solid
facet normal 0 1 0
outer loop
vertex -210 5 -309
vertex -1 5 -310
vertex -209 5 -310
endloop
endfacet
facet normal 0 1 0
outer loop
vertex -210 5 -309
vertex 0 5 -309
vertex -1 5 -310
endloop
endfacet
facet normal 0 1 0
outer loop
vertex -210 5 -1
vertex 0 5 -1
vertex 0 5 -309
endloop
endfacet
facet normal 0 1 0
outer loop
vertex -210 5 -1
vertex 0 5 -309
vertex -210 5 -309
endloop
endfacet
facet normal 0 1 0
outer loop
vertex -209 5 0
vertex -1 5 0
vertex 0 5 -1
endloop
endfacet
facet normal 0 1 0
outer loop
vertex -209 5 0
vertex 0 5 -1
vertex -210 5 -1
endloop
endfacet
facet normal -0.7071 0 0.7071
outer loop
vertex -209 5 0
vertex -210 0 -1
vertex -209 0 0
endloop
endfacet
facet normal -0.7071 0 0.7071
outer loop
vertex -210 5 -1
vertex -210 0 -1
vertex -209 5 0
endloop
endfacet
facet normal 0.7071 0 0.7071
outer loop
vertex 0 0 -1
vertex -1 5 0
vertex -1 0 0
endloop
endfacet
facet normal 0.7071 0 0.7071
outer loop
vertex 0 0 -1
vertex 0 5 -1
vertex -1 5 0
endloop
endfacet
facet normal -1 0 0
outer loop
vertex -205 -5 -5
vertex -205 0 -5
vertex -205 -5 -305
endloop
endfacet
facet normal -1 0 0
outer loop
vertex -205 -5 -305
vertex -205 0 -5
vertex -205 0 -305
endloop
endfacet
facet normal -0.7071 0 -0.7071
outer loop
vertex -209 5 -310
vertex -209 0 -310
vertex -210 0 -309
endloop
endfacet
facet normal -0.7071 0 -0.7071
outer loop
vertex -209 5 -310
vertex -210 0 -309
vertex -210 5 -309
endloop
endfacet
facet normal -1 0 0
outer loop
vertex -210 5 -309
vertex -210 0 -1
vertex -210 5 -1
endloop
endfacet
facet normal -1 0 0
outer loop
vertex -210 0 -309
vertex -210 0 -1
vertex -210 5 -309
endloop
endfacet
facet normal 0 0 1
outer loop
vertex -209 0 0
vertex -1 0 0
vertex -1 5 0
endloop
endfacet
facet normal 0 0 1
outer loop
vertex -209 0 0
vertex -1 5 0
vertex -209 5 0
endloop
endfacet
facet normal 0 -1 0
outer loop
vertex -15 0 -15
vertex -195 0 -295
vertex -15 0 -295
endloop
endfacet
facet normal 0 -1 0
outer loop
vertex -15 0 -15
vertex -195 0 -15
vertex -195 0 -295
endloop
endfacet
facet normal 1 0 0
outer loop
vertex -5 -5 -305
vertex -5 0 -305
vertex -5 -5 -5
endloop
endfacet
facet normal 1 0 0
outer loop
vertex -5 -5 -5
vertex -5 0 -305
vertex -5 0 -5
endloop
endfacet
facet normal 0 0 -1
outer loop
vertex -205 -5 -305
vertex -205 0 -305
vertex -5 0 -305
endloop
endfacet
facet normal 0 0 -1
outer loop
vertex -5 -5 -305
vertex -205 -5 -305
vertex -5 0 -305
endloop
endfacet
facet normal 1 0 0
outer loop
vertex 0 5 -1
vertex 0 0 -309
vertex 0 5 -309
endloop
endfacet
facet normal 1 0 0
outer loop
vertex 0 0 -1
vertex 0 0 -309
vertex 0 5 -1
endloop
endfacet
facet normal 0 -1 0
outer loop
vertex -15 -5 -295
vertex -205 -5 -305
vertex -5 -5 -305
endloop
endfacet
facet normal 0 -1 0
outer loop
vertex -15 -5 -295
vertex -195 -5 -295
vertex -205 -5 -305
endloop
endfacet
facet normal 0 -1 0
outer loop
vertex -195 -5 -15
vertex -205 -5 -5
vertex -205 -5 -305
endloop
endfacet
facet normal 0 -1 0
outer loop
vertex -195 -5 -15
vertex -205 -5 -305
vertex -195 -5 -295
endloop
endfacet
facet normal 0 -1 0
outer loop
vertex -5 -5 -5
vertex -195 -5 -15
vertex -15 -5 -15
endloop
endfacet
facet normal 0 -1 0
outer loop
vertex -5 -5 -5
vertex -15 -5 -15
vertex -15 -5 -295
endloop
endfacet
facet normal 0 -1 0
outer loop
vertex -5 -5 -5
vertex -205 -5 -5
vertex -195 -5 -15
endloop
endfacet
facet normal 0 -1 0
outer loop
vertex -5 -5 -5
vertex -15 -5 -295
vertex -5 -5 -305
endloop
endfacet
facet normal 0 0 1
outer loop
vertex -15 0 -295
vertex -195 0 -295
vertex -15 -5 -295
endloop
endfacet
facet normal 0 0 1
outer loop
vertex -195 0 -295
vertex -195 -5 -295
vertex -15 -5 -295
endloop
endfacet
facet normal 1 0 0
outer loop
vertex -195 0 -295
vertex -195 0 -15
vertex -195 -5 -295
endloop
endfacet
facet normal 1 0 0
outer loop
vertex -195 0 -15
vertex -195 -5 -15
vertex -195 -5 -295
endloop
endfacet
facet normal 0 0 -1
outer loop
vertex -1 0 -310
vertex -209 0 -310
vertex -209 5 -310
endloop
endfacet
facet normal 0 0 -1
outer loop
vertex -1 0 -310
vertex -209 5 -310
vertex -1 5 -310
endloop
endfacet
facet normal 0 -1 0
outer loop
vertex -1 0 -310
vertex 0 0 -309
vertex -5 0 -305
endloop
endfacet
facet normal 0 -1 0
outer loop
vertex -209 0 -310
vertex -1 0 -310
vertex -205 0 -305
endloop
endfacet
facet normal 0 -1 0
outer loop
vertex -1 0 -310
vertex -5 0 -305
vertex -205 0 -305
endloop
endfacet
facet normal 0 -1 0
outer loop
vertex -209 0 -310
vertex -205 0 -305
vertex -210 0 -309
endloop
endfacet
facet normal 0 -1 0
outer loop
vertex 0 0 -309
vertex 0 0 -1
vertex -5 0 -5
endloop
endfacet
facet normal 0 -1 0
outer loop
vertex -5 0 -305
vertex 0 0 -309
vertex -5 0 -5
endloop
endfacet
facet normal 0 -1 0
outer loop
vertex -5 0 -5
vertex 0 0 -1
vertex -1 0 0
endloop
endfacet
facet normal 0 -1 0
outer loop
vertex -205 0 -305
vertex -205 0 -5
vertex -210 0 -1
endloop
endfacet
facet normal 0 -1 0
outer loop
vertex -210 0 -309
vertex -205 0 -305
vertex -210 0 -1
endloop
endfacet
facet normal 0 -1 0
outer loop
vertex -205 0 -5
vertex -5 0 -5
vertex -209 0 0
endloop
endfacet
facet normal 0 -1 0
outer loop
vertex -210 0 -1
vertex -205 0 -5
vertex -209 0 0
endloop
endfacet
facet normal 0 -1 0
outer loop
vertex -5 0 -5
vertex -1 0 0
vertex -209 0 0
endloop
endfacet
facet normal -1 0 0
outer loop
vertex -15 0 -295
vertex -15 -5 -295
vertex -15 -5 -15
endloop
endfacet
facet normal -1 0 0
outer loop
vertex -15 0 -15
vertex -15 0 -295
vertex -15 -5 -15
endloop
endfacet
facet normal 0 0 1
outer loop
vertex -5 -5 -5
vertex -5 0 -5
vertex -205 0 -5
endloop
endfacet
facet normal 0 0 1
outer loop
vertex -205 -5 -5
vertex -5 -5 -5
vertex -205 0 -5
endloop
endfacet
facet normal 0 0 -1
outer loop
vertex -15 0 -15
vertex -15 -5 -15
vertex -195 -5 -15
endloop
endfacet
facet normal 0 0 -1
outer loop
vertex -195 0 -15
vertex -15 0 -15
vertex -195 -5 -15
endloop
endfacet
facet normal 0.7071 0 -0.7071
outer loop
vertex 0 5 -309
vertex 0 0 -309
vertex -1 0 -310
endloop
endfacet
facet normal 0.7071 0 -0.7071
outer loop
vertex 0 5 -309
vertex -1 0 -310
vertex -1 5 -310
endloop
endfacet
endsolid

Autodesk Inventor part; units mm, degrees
ref_plane "YZ Plane" through (0, 0, 0) normal (1, 0, 0) x (0, 1, 0)
ref_plane "XZ Plane" through (0, 0, 0) normal (0, 1, 0) x (-1, 0, 0)
ref_plane "XY Plane" through (0, 0, 0) normal (0, 0, 1) x (1, 0, 0)
sketch "Sketch1" plane through (0, 0, 0) normal (0, 1, 0) x (-1, 0, 0)
  line L0 (0, 0) -> (210, 0)
  line L1 (210, 0) -> (210, -310)
  line L2 (210, -310) -> (0, -310)
  line L3 (0, -310) -> (0, 0)
  dimension "d0" = 310
  dimension "d1" = 210
extrude "Extrusion1" add sketch "Sketch1" along normal blind 5
chamfer "Chamfer1" distance 1 angle 45 4 edges at (0, 2.5, -310) (0, 2.5, 0) (-210, 2.5, -310) (-210, 2.5, 0)
sketch "Sketch2" plane through (0, 0, 0) normal (0, -1, 0) x (1, 0, 0)
  line L0 (-205, -305) -> (-5, -305)
  line L1 (-5, -305) -> (-5, -5)
  line L2 (-5, -5) -> (-205, -5)
  line L3 (-205, -5) -> (-205, -305)
  line L4 (0, -1) -> (0, -309) projected
  line L5 (-209, 0) -> (-1, 0) projected
  point P0 (0, 0)
  dimension "d7" = 300
  dimension "d8" = 200
  dimension "d9" = 5
  dimension "d10" = 5
extrude "Extrusion2" add sketch "Sketch2" along normal blind 5
sketch "Sketch3" plane through (0, -5, 0) normal (0, -1, 0) x (1, 0, 0)
  line L0 (-195, -295) -> (-15, -295)
  line L1 (-15, -295) -> (-15, -15)
  line L2 (-15, -15) -> (-195, -15)
  line L3 (-195, -15) -> (-195, -295)
  line L4 (-5, -5) -> (-205, -5) projected
  line L5 (-205, -5) -> (-205, -305) projected
  point P0 (0, 0)
  dimension "d13" = 280
  dimension "d14" = 180
  dimension "d15" = 10
  dimension "d16" = 10
extrude "Extrusion3" cut sketch "Sketch3" against normal blind 5
properties part number "Tutup_Box"
